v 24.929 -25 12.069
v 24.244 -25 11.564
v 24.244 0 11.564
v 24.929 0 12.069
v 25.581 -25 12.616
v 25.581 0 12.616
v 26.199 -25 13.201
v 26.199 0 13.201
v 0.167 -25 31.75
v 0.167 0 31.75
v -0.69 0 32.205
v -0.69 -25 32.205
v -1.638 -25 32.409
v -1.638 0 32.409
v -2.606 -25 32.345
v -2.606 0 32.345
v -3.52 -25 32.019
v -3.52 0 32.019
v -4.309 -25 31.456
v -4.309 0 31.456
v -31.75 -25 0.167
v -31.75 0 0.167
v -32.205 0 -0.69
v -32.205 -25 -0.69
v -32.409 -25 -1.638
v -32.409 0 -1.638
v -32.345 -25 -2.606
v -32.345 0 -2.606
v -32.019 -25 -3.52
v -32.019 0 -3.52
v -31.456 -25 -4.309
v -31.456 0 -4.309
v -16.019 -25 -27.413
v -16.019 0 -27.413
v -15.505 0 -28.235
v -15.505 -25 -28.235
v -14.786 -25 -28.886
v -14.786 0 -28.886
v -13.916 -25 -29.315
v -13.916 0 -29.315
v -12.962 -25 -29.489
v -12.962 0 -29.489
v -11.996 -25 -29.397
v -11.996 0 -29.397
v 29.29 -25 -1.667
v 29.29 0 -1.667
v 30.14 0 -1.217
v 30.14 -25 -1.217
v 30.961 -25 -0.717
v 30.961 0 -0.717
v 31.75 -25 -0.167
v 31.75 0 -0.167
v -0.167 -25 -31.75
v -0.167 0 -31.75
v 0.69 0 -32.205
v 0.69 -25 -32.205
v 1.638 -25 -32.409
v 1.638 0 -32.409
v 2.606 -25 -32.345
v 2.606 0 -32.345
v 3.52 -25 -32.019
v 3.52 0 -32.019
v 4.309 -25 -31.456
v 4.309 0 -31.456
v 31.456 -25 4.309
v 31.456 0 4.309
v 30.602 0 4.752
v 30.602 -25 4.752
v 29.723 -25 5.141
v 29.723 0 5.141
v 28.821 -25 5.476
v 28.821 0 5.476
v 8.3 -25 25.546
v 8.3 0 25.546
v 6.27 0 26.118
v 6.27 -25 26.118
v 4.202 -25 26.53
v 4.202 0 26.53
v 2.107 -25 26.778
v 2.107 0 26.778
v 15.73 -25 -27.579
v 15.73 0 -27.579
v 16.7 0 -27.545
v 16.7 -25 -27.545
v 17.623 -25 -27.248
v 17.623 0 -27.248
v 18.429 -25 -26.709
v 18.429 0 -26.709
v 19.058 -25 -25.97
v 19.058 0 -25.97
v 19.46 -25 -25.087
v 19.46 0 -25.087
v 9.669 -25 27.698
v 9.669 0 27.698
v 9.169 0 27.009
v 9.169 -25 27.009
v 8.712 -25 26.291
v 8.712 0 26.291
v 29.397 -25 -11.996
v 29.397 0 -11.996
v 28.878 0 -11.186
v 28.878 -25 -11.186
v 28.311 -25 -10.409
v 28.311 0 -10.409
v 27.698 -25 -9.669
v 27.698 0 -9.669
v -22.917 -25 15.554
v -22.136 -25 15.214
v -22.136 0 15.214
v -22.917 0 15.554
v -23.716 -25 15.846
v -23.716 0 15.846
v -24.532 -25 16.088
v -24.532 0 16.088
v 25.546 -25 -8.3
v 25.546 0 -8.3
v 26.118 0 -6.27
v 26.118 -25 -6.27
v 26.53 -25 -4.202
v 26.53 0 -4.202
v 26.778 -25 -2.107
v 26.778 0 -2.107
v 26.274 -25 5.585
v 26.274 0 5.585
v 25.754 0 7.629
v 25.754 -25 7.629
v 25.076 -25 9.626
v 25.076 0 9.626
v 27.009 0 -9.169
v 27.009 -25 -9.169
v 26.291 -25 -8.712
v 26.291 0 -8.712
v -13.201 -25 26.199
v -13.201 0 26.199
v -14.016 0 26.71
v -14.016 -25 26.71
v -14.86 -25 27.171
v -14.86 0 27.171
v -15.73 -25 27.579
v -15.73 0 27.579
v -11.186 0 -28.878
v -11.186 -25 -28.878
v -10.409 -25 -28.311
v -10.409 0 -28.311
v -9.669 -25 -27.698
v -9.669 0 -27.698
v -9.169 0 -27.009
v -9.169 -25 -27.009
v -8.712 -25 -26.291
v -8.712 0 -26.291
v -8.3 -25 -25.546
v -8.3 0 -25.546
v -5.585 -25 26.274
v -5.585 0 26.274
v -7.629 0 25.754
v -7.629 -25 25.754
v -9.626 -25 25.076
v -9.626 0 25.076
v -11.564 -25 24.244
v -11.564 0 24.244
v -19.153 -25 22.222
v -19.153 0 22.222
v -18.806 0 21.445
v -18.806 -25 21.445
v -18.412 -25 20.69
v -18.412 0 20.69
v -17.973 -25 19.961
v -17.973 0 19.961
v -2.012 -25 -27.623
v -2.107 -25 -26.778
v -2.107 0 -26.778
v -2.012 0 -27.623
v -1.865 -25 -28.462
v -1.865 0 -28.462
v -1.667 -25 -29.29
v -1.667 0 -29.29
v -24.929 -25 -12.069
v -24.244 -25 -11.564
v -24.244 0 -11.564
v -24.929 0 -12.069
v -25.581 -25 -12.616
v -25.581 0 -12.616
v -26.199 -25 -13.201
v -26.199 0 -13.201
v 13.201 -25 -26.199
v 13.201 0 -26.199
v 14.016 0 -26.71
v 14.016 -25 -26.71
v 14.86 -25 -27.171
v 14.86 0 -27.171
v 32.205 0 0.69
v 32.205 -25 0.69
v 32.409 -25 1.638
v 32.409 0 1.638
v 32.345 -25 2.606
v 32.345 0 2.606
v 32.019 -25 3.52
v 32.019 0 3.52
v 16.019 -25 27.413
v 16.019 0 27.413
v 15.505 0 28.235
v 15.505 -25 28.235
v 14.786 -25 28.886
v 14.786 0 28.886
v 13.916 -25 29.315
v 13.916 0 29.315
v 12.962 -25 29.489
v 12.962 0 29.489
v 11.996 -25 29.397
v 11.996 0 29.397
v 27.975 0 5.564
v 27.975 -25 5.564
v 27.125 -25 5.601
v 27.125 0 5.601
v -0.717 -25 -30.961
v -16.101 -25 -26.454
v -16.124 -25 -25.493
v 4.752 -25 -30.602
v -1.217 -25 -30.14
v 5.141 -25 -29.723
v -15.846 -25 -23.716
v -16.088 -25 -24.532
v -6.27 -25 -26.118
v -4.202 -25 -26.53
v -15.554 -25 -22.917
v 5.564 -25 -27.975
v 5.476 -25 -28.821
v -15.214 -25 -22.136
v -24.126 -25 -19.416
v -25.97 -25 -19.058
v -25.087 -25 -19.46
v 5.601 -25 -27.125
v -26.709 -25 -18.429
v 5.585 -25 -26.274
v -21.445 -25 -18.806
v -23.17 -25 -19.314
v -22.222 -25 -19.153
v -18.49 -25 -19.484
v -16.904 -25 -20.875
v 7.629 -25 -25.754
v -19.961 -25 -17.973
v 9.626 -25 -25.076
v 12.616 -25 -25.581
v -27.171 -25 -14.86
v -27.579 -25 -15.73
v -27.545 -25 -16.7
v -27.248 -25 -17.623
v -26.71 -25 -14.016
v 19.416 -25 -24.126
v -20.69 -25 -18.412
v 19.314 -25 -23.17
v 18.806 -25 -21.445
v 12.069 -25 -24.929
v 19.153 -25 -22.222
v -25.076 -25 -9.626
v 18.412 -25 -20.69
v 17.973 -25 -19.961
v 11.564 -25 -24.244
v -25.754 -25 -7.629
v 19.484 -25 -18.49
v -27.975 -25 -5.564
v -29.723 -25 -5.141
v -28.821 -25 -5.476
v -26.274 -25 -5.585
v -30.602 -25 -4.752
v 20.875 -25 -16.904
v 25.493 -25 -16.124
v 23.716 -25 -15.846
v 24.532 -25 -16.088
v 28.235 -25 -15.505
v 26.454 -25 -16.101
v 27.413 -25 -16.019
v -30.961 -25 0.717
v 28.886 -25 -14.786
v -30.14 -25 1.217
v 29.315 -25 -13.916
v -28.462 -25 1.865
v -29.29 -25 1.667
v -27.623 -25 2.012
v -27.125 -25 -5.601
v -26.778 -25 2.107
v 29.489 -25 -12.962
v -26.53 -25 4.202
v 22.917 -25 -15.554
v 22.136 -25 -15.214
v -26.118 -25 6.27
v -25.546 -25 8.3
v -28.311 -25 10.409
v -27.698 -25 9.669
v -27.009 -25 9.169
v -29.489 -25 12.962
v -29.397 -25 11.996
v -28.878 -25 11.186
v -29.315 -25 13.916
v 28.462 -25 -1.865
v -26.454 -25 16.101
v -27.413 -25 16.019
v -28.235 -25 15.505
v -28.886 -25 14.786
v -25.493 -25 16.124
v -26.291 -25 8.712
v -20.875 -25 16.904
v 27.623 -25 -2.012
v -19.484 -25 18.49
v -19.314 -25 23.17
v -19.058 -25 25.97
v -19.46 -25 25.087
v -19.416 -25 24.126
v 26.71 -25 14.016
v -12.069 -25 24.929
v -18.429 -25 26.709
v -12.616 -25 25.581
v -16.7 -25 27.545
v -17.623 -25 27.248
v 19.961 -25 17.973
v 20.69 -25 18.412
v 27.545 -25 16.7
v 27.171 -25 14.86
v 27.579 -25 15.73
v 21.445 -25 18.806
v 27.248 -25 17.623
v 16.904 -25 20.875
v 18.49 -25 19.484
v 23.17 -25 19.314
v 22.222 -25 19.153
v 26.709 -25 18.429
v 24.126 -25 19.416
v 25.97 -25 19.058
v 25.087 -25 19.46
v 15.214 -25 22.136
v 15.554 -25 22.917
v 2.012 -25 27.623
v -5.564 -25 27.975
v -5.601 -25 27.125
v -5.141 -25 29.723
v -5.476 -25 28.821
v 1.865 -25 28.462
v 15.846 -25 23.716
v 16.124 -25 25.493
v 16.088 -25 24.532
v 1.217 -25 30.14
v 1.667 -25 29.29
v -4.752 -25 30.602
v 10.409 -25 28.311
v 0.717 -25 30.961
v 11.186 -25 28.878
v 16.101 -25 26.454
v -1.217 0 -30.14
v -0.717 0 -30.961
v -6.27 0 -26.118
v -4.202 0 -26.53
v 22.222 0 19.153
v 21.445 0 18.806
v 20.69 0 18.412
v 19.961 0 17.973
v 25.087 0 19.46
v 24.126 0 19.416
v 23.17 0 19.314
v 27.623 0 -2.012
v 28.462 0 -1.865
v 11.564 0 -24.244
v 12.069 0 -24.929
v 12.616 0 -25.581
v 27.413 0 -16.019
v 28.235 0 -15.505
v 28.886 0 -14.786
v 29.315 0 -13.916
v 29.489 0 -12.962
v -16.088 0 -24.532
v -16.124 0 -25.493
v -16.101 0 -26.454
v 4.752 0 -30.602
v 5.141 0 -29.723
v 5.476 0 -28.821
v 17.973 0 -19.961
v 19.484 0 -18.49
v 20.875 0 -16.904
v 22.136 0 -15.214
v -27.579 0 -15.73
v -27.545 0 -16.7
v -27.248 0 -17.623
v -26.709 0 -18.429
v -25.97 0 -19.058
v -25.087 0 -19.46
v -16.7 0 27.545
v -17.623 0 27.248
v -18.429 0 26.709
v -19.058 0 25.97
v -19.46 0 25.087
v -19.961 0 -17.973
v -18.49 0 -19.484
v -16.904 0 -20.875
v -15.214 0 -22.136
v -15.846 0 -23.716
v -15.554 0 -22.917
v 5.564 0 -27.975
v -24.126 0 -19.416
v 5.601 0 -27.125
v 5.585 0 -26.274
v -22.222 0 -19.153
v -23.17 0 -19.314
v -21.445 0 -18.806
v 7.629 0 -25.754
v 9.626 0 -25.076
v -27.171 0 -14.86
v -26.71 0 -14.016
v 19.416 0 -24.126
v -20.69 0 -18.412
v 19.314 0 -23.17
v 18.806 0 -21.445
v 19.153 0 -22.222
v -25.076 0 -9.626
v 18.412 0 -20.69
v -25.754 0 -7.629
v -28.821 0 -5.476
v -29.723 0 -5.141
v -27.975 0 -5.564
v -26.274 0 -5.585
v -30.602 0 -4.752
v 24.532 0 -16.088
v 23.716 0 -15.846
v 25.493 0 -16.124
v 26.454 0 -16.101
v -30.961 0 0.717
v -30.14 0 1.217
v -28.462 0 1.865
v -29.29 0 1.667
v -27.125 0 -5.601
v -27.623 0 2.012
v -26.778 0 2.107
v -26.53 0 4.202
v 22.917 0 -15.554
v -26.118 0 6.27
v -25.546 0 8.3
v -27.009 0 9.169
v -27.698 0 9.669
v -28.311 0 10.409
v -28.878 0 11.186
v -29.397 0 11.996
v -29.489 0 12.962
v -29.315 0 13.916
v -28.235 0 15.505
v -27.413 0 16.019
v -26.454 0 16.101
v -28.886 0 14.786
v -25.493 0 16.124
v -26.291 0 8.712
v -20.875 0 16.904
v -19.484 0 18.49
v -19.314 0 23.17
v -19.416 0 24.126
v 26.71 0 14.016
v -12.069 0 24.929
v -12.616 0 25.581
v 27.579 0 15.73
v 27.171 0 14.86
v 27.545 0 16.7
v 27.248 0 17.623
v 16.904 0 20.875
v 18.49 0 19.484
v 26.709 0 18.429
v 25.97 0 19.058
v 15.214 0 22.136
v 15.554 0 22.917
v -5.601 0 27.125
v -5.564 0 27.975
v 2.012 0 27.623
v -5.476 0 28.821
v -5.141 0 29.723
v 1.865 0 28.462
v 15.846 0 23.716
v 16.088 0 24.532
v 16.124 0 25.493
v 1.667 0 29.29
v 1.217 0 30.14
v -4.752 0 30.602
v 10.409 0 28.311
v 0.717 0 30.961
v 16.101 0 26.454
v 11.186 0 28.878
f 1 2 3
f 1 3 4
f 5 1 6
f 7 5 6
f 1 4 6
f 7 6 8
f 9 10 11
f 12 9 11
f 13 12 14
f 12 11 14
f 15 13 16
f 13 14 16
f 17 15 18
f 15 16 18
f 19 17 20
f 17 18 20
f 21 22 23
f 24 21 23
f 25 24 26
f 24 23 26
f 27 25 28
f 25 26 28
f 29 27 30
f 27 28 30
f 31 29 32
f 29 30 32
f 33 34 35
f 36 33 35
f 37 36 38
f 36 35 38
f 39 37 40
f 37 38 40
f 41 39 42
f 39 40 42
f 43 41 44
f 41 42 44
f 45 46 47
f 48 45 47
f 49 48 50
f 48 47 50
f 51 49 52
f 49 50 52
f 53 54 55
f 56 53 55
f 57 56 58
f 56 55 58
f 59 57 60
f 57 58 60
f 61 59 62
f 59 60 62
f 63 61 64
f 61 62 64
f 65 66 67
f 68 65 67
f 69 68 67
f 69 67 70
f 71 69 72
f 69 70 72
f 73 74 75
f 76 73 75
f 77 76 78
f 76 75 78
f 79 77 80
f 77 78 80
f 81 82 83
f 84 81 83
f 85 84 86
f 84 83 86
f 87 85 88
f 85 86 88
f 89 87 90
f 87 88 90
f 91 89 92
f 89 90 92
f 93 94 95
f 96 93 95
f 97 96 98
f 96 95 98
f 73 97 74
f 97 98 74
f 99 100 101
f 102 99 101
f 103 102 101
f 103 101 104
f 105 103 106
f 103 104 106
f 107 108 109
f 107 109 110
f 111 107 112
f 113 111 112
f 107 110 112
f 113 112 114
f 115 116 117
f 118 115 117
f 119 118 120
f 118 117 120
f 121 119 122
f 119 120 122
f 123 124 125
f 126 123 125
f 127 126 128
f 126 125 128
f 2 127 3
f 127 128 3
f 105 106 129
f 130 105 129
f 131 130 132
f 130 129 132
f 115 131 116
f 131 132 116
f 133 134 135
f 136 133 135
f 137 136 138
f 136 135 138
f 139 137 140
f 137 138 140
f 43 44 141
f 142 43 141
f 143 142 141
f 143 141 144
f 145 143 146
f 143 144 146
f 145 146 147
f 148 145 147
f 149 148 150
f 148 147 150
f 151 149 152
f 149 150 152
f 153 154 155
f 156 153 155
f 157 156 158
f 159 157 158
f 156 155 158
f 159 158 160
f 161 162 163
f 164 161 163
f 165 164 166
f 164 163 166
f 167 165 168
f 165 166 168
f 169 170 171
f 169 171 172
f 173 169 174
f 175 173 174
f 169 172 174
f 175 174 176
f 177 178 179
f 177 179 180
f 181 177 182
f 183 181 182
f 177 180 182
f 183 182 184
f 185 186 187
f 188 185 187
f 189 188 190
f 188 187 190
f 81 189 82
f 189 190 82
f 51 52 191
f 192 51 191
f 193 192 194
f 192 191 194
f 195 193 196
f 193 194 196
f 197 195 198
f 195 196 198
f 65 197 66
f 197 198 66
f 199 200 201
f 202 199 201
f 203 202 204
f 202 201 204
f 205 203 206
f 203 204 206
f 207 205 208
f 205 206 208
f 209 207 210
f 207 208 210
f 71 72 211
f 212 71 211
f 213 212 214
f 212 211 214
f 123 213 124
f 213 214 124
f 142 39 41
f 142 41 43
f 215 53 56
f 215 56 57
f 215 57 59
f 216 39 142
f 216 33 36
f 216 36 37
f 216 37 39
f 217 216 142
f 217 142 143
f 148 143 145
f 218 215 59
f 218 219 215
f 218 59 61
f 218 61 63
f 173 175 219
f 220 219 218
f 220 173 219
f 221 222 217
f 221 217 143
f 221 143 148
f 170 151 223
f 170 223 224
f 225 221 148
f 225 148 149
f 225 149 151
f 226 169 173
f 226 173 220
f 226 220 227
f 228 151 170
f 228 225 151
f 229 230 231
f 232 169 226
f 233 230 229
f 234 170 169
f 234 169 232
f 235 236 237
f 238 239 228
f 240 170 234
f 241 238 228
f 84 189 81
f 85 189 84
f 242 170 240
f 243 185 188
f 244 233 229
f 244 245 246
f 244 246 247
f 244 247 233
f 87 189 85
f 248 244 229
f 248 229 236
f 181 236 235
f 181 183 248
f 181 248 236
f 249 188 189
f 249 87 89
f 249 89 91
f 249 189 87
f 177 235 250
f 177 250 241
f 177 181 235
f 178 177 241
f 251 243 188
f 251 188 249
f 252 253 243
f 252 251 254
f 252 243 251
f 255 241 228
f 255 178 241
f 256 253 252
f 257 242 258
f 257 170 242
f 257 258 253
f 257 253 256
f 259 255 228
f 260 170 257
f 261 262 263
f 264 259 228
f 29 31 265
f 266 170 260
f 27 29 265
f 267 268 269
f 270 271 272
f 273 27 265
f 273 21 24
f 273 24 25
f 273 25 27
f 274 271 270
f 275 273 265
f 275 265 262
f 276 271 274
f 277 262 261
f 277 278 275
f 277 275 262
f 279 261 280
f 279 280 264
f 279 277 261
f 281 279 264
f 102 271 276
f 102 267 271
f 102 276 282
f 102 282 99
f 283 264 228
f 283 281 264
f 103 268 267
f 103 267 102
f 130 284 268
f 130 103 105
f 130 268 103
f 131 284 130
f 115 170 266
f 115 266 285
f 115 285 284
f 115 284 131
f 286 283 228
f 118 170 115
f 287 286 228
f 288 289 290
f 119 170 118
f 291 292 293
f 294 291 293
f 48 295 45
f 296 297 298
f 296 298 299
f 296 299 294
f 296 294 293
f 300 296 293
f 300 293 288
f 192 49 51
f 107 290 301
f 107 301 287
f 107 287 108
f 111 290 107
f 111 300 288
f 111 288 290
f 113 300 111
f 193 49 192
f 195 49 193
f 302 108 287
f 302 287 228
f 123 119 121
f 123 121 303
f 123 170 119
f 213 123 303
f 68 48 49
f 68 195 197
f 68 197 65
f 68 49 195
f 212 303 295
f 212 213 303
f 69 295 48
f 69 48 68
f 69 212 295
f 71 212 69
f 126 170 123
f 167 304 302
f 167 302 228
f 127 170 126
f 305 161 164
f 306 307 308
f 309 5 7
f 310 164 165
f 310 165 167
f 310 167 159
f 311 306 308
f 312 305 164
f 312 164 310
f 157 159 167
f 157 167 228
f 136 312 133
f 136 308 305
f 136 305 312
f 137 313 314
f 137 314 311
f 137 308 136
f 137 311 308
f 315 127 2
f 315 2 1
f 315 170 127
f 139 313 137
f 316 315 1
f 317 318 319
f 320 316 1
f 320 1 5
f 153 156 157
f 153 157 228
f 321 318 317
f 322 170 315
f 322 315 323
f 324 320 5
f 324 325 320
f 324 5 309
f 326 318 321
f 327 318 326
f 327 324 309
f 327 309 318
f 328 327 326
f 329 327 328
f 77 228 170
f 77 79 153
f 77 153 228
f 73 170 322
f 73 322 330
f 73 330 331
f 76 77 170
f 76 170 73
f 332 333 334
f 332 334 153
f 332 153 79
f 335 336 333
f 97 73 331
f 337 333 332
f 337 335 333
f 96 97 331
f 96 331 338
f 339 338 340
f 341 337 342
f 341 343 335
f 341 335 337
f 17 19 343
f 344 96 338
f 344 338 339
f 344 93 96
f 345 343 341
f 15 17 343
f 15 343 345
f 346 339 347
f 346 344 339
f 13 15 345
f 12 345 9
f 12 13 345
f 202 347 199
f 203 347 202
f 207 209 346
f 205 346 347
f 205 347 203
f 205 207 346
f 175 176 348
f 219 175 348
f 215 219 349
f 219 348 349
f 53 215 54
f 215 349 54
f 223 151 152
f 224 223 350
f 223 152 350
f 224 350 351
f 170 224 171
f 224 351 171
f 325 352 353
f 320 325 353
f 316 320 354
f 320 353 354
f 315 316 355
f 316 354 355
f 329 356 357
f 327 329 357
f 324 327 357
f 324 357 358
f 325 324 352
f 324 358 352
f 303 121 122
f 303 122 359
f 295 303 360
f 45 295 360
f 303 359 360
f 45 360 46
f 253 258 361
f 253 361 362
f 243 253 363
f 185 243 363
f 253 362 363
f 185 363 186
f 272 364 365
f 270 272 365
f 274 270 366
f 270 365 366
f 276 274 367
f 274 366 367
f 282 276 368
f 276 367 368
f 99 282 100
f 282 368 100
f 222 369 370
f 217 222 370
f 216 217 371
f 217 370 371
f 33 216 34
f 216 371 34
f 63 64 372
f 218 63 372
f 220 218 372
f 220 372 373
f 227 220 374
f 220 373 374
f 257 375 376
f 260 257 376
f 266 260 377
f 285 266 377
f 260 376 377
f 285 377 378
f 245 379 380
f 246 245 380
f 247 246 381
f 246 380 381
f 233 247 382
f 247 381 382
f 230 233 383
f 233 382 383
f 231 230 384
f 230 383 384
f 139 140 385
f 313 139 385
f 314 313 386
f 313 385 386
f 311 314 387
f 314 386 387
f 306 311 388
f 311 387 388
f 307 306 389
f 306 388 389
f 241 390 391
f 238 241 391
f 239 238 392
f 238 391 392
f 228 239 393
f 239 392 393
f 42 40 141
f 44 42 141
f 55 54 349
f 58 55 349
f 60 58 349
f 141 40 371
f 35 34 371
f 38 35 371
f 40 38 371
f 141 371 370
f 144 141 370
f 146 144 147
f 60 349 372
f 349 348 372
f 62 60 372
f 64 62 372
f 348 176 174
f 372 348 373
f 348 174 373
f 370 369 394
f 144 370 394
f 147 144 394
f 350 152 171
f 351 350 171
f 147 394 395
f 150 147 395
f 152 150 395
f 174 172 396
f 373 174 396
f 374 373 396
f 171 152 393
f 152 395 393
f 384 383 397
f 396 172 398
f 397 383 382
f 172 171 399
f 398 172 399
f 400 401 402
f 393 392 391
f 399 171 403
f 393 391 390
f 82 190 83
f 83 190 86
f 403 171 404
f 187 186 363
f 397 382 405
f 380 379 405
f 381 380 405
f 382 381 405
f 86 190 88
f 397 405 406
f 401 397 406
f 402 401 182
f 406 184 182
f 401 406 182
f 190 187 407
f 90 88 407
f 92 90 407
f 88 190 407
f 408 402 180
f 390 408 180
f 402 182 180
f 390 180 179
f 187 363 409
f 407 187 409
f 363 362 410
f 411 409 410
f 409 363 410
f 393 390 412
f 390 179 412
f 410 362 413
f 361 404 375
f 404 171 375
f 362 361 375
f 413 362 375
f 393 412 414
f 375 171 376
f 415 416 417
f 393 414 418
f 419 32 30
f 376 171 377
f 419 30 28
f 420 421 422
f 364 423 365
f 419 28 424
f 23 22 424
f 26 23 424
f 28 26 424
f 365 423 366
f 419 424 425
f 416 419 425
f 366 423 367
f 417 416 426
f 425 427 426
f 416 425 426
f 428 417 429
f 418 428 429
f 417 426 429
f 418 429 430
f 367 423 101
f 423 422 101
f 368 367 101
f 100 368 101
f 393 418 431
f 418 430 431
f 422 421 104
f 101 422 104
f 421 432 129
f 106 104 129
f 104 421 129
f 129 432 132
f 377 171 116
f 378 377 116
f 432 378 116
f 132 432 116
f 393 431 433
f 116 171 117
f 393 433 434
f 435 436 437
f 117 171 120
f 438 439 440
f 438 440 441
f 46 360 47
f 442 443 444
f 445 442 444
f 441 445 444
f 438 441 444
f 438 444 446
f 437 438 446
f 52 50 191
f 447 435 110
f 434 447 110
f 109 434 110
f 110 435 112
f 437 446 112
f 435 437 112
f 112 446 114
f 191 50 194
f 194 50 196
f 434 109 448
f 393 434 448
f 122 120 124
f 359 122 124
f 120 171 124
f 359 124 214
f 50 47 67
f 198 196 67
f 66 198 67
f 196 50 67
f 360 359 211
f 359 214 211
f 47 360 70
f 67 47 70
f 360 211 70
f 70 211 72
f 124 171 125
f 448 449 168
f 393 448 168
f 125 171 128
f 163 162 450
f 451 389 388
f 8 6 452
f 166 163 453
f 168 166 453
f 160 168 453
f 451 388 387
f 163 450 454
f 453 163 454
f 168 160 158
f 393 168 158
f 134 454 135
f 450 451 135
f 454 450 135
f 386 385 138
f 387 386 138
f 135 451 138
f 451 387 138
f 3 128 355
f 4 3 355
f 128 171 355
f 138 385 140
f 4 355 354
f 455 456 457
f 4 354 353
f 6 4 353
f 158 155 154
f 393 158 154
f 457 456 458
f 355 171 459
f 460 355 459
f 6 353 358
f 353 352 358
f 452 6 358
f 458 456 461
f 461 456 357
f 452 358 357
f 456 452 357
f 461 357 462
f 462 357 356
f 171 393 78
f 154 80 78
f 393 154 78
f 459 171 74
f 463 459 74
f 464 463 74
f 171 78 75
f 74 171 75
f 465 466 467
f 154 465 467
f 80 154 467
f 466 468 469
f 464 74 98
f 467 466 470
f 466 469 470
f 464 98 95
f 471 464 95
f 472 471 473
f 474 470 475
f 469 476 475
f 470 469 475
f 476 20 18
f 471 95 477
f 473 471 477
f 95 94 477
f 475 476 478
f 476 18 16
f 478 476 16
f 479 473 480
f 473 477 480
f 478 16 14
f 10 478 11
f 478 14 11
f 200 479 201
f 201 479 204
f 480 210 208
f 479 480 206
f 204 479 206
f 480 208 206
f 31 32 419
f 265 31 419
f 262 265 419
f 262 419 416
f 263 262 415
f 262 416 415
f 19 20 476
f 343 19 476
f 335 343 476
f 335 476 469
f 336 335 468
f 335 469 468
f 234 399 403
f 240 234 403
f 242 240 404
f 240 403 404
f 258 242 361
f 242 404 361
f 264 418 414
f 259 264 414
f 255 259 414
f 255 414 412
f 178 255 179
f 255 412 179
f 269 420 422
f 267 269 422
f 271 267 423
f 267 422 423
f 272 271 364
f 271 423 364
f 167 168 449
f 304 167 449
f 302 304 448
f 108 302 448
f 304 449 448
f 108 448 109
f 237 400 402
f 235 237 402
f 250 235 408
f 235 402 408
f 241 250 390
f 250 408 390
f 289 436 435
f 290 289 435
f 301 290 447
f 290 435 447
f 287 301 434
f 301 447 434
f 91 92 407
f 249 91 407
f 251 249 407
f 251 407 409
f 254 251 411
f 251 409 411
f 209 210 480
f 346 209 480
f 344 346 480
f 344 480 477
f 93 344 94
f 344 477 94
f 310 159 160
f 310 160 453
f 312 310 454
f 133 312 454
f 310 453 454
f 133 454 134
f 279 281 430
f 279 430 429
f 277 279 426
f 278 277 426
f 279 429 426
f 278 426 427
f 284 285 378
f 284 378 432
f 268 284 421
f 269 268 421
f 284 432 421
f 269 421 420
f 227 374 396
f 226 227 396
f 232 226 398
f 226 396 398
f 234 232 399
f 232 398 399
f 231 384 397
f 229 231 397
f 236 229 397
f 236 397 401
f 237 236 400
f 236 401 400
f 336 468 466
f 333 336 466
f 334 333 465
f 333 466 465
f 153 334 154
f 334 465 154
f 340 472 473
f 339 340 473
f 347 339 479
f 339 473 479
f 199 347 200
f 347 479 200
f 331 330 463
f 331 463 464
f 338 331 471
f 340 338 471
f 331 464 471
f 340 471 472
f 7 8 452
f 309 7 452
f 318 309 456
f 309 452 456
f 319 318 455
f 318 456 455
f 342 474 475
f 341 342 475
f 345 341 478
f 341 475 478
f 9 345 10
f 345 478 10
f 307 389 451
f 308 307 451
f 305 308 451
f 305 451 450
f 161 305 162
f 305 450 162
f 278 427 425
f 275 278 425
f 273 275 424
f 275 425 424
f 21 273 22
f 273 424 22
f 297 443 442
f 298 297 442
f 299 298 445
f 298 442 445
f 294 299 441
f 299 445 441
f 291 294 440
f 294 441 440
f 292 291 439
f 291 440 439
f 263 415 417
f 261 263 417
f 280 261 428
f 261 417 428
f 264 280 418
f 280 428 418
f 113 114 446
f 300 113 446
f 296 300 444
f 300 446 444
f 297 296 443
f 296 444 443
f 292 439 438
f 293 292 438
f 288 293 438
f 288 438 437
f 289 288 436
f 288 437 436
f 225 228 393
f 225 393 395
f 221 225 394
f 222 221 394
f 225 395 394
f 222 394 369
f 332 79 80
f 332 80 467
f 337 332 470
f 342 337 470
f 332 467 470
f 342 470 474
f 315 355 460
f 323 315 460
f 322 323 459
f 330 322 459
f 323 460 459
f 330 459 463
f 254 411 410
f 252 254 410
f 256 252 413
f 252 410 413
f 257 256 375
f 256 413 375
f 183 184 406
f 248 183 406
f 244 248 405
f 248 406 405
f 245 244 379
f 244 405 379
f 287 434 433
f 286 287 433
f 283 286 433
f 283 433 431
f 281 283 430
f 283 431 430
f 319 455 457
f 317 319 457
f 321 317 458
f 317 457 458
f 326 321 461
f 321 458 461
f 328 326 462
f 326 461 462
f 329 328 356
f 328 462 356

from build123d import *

# Parameters (mm, degrees)
F1_DEPTH = 25
F2_DEPTH = 25
F3_COUNT = 12


with BuildPart() as f1:
    # F0 (on Front) → F1 (new body)
    with BuildSketch(Plane.XZ):
        with BuildLine():
            ThreePointArc((-5.5845651505, 26.2735435815), (-16.9038789635, -20.874514036), (26.8605, 0))
            ThreePointArc((26.8605, 0), (19.7242535187, 18.2329450002), (2.1074028217, 26.7777017983))
            ThreePointArc((2.1074028217, 26.7777017983), (-1.7567607527, 26.8029896077), (-5.5845651505, 26.2735435815))
        make_face()
        with BuildLine():
            ThreePointArc((4.0227100868, 11.3209239617), (9.8151901419, 6.9287486797), (12.0143878658, 0))
            ThreePointArc((12.0143878658, 0), (9.8151901419, -6.9287486797), (4.0227100868, -11.3209239617))
            ThreePointArc((4.0227100868, -11.3209239617), (0, -12.0143878658), (-4.0227100868, -11.3209239617))
            ThreePointArc((-4.0227100868, -11.3209239617), (-12.0143878658, 0), (-4.0227100868, 11.3209239617))
            ThreePointArc((-4.0227100868, 11.3209239617), (0, 12.0143878658), (4.0227100868, 11.3209239617))
        make_face(mode=Mode.SUBTRACT)
        with BuildLine():
            Line((4.0227100868, -11.3209239617), (4.0227100868, 11.3209239617))
            ThreePointArc((4.0227100868, 11.3209239617), (0, 12.0143878658), (-4.0227100868, 11.3209239617))
            Line((-4.0227100868, 11.3209239617), (-4.0227100868, -11.3209239617))
            ThreePointArc((-4.0227100868, -11.3209239617), (0, -12.0143878658), (4.0227100868, -11.3209239617))
        make_face()
    extrude(amount=F1_DEPTH)

    # F0 (on Front) → F2 (join)
    with BuildSketch(Plane.XZ):
        with BuildLine():
            ThreePointArc((-5.5845651505, 26.2735435815), (-1.7567607527, 26.8029896077), (2.1074028217, 26.7777017983))
            ThreePointArc((2.1074028217, 26.7777017983), (1.945127207, 28.0438038567), (1.6670221767, 29.2895989399))
            ThreePointArc((1.6670221767, 29.2895989399), (0.973127852, 30.5538872836), (0.1667310445, 31.7495622137))
            ThreePointArc((0.1667310445, 31.7495622137), (-2.1242907577, 32.4104138918), (-4.3094540977, 31.4561775392))
            ThreePointArc((-4.3094540977, 31.4561775392), (-4.952885173, 30.1654758692), (-5.4758203921, 28.8214323036))
            ThreePointArc((-5.4758203921, 28.8214323036), (-5.5889373069, 27.5499951794), (-5.5845651505, 26.2735435815))
        make_face()
    extrude(amount=F2_DEPTH)

    # F3: F1 ×12 about axis
    f3_axis = Axis((0, 0, 0), (0, 1, 0))


with BuildPart() as f1_1:
    add(f1.part)
    for i in range(1, F3_COUNT):
        add(f1.part.rotate(f3_axis, i * 360 / F3_COUNT))


solid = f1_1.part
